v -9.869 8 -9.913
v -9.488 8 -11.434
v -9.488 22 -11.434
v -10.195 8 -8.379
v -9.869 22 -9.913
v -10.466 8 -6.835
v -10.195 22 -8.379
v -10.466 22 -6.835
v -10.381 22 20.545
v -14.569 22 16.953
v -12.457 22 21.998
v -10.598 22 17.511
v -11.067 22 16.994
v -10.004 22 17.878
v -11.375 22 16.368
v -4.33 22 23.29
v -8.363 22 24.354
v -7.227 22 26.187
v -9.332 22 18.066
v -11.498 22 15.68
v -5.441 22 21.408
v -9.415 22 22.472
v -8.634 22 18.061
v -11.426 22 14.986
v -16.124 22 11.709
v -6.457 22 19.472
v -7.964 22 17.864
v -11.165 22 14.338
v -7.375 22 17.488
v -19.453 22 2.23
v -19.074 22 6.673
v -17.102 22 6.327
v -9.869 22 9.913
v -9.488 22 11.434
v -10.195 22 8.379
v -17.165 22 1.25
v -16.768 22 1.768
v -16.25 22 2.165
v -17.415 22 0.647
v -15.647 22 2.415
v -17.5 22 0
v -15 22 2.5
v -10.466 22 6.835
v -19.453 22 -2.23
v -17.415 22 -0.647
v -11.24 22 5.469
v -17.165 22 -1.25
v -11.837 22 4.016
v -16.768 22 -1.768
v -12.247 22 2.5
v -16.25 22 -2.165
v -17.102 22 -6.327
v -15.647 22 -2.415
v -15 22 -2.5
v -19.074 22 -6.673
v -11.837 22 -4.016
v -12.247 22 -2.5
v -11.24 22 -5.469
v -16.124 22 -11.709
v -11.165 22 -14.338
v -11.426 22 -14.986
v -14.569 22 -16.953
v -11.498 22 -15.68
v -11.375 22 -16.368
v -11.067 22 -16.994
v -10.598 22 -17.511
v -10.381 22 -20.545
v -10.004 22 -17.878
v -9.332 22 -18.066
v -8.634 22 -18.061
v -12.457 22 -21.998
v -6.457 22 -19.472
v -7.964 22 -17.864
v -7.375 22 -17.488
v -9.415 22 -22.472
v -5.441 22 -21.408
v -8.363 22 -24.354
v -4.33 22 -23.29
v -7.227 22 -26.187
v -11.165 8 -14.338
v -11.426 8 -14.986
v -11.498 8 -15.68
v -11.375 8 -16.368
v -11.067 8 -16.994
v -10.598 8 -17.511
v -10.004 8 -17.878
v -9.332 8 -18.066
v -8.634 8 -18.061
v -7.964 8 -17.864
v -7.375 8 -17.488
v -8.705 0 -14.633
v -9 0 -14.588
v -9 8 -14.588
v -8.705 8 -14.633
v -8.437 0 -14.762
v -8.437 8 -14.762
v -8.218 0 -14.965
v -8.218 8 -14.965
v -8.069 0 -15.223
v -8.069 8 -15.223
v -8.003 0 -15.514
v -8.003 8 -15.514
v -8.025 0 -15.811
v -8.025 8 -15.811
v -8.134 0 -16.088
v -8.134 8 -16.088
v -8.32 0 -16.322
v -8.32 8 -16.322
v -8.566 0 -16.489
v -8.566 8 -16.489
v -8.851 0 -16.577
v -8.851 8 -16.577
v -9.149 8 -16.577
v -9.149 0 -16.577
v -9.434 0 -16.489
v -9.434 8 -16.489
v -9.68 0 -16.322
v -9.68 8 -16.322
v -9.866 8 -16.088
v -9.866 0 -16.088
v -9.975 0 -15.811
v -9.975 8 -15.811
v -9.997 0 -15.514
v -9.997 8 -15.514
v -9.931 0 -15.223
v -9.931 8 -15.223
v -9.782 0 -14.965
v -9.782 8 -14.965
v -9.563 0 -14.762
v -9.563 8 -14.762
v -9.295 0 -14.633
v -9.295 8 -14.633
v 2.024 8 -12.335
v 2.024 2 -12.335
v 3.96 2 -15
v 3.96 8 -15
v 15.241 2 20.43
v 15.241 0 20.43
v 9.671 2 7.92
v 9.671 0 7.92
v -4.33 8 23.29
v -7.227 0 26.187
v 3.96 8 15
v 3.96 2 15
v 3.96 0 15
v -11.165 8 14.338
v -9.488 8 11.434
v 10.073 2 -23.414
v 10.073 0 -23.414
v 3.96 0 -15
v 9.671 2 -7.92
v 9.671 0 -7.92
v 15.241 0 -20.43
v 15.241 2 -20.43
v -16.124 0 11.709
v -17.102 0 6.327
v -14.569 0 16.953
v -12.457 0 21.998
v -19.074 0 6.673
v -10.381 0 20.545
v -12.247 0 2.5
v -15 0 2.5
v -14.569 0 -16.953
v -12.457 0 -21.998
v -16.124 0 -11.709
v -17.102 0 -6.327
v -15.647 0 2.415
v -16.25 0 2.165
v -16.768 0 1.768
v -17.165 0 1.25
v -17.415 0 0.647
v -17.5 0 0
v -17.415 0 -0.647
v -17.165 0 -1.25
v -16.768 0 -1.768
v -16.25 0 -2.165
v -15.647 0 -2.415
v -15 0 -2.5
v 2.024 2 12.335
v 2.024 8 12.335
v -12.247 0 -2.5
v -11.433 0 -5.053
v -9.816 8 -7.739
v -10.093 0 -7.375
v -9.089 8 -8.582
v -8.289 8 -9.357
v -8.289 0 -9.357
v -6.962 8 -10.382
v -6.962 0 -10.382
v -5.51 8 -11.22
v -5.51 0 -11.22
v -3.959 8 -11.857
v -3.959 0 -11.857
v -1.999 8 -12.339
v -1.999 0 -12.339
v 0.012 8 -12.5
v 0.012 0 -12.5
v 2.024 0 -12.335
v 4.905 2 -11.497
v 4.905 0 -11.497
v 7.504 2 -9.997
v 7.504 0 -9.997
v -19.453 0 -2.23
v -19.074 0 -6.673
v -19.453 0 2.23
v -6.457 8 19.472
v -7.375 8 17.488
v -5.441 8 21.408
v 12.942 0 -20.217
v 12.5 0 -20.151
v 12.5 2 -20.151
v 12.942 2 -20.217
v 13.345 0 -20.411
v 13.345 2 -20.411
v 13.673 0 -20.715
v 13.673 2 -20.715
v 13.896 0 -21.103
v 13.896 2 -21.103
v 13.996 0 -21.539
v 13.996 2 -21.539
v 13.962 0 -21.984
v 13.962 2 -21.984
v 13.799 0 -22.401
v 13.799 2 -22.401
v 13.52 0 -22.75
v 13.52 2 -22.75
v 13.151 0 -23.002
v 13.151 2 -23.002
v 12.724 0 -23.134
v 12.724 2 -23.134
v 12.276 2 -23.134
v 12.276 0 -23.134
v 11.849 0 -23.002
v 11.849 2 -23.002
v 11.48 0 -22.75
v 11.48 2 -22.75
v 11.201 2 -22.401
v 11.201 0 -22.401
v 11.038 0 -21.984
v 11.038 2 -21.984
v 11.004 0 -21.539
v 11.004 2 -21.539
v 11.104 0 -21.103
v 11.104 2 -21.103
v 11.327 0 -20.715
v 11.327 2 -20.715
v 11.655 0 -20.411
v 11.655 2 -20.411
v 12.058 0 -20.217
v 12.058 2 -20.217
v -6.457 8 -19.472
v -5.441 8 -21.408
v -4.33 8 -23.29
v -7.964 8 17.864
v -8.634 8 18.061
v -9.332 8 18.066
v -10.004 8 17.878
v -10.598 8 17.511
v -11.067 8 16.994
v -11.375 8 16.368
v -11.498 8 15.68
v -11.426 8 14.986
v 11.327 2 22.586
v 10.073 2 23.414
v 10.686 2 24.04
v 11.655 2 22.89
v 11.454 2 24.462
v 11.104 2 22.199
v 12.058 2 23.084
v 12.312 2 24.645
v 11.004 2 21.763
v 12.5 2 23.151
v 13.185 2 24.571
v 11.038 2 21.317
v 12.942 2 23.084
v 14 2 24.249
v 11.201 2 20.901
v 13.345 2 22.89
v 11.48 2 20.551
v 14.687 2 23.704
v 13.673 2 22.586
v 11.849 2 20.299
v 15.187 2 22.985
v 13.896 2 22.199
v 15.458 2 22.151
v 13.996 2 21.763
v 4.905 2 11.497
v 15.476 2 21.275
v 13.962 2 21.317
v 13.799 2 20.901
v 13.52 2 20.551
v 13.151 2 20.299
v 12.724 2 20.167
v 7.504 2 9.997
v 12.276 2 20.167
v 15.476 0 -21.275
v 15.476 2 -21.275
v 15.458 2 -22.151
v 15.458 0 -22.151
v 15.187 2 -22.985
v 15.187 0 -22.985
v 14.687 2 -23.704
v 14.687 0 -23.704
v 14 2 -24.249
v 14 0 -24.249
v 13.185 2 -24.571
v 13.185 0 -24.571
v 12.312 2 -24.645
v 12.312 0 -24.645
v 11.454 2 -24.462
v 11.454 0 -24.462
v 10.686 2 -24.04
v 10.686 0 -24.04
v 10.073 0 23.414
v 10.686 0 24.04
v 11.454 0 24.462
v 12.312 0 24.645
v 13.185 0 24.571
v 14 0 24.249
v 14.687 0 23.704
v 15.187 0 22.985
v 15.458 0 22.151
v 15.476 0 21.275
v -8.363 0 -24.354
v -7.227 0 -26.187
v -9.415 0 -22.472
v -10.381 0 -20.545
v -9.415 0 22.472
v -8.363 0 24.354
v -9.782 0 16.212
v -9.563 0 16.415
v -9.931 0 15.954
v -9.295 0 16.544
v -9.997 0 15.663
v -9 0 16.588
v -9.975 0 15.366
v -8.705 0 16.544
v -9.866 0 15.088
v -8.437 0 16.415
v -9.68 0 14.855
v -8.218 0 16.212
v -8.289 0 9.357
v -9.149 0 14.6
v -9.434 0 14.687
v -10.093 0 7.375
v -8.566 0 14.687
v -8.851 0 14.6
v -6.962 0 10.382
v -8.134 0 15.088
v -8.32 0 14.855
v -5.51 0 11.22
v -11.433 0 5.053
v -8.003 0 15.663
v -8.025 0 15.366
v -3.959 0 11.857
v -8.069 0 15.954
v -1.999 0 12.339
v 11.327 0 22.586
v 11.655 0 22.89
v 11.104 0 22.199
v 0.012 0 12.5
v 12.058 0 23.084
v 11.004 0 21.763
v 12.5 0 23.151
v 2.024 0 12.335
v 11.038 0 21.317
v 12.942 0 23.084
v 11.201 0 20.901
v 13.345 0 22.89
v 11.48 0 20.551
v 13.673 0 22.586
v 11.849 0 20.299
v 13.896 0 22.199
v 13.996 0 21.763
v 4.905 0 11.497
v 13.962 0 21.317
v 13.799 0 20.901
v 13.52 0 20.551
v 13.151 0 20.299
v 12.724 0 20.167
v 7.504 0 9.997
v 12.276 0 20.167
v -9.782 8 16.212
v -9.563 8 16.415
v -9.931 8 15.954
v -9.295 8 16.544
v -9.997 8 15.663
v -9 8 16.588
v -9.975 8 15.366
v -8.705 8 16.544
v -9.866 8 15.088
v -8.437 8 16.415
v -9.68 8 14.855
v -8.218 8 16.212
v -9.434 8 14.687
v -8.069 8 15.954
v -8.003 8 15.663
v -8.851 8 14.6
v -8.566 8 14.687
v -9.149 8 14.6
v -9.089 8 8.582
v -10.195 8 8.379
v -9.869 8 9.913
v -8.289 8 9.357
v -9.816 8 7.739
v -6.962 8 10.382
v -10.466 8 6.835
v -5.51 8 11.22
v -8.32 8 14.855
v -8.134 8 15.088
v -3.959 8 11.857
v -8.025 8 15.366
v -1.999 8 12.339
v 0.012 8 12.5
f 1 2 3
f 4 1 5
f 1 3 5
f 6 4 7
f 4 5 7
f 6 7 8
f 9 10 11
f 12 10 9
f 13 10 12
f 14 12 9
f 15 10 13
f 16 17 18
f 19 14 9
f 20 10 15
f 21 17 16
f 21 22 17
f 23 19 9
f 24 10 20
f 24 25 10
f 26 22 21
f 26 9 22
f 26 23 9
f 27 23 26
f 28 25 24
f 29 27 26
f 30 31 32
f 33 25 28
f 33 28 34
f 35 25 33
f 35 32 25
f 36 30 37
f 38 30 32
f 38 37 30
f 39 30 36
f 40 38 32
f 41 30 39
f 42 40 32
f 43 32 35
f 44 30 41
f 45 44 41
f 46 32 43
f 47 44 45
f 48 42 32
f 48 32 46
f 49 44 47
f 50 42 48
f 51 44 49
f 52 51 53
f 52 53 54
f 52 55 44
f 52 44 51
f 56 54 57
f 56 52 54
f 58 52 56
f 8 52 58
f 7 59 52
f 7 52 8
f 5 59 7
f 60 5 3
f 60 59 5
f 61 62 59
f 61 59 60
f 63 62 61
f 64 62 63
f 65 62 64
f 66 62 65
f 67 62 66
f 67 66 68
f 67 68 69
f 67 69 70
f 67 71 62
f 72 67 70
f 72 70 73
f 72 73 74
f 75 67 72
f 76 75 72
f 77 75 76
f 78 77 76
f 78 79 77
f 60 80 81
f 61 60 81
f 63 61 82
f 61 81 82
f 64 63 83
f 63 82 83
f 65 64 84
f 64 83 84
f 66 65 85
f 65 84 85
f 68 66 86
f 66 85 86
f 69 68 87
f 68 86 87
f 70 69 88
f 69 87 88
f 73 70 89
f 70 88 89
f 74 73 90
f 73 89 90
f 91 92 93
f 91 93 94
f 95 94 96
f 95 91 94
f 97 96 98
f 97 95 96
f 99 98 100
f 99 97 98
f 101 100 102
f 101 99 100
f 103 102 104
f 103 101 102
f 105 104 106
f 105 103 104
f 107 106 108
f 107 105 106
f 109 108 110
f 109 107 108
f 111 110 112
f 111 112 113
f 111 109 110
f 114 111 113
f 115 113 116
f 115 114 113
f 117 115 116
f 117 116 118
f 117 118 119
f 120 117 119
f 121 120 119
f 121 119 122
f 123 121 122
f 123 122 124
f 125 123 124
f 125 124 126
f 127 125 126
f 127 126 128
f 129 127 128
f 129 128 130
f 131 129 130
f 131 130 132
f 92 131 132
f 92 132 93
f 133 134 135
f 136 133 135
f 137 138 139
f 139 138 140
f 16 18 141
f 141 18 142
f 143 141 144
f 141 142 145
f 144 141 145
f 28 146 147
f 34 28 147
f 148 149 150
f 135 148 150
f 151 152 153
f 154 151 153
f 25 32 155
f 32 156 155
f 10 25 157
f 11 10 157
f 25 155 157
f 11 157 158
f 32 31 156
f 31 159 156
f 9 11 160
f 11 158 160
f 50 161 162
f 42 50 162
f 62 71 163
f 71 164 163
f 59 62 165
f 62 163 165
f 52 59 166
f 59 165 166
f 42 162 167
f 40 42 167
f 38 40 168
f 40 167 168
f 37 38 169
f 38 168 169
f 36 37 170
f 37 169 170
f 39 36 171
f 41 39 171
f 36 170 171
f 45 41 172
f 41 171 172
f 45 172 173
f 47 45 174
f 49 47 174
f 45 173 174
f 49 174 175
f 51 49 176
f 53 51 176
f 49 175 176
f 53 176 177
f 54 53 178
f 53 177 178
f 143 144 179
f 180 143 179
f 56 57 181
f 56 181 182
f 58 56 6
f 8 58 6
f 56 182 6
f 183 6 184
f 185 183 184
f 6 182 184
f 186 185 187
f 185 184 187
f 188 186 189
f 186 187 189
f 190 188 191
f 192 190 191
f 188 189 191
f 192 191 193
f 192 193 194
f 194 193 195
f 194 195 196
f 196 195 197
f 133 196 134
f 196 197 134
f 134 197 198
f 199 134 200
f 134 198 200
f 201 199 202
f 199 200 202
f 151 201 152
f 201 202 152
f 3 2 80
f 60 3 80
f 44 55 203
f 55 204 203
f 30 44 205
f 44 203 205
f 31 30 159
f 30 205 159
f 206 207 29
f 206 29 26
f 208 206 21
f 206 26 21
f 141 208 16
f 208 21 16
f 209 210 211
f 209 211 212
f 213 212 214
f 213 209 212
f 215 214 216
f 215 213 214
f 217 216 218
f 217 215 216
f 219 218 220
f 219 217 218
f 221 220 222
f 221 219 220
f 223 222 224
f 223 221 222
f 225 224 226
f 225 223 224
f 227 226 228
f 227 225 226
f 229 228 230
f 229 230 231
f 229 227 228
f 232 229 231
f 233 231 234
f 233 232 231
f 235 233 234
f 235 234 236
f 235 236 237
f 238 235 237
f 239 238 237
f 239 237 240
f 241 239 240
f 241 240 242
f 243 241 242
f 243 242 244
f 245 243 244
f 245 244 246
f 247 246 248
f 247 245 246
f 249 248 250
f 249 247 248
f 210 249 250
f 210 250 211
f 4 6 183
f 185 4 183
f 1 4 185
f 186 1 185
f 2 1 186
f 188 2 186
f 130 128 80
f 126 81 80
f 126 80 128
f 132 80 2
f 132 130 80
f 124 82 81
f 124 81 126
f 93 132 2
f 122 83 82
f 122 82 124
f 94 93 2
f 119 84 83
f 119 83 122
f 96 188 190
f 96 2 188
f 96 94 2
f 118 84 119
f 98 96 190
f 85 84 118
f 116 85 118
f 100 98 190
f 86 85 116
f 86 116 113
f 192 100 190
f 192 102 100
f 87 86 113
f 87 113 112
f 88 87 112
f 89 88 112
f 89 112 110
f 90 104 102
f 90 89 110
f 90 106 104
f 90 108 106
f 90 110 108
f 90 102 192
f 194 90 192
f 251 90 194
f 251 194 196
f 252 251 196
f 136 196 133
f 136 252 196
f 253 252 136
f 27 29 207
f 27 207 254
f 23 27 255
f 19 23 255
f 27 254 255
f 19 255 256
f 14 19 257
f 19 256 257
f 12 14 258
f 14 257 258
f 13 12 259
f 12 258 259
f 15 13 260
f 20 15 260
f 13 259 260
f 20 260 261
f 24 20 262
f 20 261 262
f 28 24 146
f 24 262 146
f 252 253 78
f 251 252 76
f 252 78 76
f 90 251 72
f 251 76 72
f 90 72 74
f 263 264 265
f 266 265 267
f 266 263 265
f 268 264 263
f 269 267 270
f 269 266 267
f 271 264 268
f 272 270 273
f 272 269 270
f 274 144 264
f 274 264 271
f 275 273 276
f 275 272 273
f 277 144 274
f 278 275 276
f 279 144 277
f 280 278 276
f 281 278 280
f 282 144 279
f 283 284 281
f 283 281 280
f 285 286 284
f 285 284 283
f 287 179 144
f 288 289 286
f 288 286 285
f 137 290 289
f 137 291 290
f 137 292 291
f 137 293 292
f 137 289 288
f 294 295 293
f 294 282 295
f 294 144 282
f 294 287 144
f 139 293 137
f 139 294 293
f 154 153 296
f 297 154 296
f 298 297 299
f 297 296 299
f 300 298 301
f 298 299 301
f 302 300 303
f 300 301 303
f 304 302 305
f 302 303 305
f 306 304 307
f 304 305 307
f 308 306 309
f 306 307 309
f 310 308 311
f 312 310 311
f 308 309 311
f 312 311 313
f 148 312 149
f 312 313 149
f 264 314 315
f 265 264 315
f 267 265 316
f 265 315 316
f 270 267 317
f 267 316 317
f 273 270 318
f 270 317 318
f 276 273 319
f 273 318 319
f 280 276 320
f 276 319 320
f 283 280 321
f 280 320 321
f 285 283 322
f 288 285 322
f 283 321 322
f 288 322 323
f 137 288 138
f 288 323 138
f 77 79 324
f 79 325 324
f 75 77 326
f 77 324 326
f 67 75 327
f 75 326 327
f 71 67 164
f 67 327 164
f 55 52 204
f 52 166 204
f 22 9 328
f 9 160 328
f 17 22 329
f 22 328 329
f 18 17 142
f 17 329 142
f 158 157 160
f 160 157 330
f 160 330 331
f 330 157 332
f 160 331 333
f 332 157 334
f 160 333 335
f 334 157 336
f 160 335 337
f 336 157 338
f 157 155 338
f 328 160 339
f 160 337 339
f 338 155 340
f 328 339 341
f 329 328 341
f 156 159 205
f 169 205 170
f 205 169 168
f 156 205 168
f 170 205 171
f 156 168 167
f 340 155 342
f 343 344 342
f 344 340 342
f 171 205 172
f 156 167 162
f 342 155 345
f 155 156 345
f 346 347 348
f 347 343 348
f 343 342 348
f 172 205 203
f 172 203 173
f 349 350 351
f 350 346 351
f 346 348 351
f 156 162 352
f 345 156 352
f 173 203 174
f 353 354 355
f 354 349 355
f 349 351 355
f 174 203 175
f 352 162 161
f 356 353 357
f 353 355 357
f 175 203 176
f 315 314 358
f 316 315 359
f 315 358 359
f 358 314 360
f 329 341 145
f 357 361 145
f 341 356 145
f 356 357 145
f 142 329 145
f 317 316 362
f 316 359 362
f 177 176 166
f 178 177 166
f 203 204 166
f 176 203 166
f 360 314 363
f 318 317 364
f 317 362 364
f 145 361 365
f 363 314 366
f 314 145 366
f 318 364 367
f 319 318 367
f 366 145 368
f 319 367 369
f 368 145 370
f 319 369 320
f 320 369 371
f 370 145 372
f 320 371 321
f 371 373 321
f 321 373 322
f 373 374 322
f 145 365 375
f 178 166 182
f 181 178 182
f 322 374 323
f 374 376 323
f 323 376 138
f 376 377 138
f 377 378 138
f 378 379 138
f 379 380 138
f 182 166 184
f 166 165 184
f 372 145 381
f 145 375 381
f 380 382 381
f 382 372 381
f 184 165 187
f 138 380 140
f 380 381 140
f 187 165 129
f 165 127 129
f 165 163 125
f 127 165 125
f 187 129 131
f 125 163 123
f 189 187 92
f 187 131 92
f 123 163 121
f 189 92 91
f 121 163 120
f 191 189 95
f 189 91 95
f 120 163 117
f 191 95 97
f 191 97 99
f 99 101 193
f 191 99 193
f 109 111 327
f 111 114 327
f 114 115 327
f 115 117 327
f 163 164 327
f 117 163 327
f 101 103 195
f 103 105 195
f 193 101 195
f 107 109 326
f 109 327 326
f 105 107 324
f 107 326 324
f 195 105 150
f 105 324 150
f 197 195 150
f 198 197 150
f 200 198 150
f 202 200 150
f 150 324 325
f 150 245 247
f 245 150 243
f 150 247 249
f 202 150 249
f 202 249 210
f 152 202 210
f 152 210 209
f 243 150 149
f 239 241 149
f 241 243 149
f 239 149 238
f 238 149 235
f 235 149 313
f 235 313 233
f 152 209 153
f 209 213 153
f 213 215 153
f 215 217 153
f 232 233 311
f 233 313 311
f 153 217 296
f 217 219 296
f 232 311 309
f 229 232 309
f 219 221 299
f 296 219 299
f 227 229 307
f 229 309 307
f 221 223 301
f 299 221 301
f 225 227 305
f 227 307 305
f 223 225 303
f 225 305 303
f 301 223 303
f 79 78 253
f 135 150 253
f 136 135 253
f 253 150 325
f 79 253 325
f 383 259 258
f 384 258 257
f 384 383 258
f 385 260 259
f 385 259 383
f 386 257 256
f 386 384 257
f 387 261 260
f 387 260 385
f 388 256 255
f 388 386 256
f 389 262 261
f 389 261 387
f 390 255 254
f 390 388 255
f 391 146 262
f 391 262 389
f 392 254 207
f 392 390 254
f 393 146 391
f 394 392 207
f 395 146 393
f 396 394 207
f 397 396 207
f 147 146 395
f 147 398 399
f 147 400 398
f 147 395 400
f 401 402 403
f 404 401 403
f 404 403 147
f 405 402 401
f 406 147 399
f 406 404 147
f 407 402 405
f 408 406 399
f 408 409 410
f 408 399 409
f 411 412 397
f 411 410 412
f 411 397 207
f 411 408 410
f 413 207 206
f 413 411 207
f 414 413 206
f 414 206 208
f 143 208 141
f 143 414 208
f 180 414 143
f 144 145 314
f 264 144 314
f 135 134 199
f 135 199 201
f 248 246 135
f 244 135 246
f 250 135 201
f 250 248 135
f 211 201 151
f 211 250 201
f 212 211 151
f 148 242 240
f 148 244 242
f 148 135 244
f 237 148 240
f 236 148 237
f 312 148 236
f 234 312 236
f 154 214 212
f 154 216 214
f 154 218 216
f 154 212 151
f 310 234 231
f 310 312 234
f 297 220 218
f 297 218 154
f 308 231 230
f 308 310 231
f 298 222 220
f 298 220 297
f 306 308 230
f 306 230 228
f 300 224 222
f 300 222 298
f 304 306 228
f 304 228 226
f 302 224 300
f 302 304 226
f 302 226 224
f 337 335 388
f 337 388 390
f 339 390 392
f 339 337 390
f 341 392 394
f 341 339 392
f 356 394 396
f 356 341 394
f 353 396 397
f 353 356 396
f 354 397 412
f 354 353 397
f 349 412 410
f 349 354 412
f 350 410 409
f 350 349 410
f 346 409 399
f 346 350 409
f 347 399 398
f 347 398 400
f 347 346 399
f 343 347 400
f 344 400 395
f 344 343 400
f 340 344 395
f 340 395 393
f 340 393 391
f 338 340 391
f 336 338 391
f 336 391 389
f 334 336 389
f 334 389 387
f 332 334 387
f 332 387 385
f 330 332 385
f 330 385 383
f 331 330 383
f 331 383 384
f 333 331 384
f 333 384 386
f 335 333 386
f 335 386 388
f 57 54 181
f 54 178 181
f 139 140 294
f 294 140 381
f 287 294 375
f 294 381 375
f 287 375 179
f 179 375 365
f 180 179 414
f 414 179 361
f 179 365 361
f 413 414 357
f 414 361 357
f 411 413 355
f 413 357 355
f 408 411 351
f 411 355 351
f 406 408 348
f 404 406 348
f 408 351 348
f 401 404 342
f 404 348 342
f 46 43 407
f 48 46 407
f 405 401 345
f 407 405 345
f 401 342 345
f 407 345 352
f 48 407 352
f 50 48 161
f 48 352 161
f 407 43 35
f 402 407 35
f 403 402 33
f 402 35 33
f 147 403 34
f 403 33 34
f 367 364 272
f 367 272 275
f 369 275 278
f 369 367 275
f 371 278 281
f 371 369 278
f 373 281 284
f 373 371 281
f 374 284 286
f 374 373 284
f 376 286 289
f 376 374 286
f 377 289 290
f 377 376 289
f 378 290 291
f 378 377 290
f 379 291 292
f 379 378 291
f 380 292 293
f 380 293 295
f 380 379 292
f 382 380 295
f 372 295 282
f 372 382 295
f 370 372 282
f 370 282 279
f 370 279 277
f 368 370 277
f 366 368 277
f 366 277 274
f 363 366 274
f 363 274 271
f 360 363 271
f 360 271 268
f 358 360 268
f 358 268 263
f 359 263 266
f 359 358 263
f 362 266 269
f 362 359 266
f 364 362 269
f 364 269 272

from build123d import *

# Parameters (mm, degrees)
SKETCH2_R           = 1
BOSS_EXTRUDE1_DEPTH = 8
SKETCH2_5_R         = 1.5
BOSS_EXTRUDE9_DEPTH = 2
SKETCH2_4_R         = 1.5
BOSS_EXTRUDE6_DEPTH = 2
BOSS_EXTRUDE7_DEPTH = 14
SKETCH7_R           = 44
CUT_EXTRUDE2_DEPTH  = 14


with BuildPart() as part:
    # Sketch2 → Boss-Extrude1 (new body)
    with BuildSketch(Plane(origin=(0, 0, 0), x_dir=(1, 0, 0), z_dir=(0, 1, 0))):
        with BuildLine():
            Line((-15, 2.5), (-12.247448714, 2.5))
            ThreePointArc((-12.247448714, 2.5), (-7.093218404, 10.292533831), (2.023666108, 12.335103384))
            Line((2.023666108, 12.335103384), (3.959826833, 15))
            Line((3.959826833, 15), (-7.227290386, 26.187117219))
            ThreePointArc((-7.227290386, 26.187117219), (-8.899257061, 23.419057575), (-10.381047178, 20.54470116))
            Line((-10.381047178, 20.54470116), (-12.456884927, 21.9982184))
            ThreePointArc((-12.456884927, 21.9982184), (-15.417724422, 14.351792983), (-17.102086602, 6.32699914))
            Line((-17.102086602, 6.32699914), (-19.074188035, 6.67300086))
            ThreePointArc((-19.074188035, 6.67300086), (-19.5, 0), (-19.074188035, -6.67300086))
            Line((-19.074188035, -6.67300086), (-17.102086602, -6.32699914))
            ThreePointArc((-17.102086602, -6.32699914), (-15.417724422, -14.351792983), (-12.456884927, -21.9982184))
            Line((-12.456884927, -21.9982184), (-10.381047178, -20.54470116))
            ThreePointArc((-10.381047178, -20.54470116), (-8.899257061, -23.419057575), (-7.227290386, -26.187117219))
            Line((-7.227290386, -26.187117219), (3.959826833, -15))
            Line((3.959826833, -15), (2.023666108, -12.335103384))
            ThreePointArc((2.023666108, -12.335103384), (-7.093218404, -10.292533831), (-12.247448714, -2.5))
            Line((-12.247448714, -2.5), (-15, -2.5))
            ThreePointArc((-15, -2.5), (-17.5, 0), (-15, 2.5))
        make_face()
        with Locations((-9, 15.588457268)):
            Circle(SKETCH2_R, mode=Mode.SUBTRACT)
        with Locations((-9, -15.588457268)):
            Circle(SKETCH2_R, mode=Mode.SUBTRACT)
    extrude(amount=BOSS_EXTRUDE1_DEPTH)

    # Sketch2<5> → Boss-Extrude9 (add)
    # profile 1 of 2: a face of its own
    with BuildSketch(Plane(origin=(0, 0, 0), x_dir=(1, 0, 0), z_dir=(0, 1, 0))):
        with BuildLine():
            Line((10.072949017, 23.413990851), (2.023666108, 12.335103384))
            ThreePointArc((2.023666108, 12.335103384), (6.25, 10.825317547), (9.670679834, 7.92009795))
            Line((9.670679834, 7.92009795), (15.240636373, 20.430425165))
            ThreePointArc((15.240636373, 20.430425165), (14, 24.248711306), (10.072949017, 23.413990851))
        make_face()
        with Locations((12.5, 21.650635095)):
            Circle(SKETCH2_5_R, mode=Mode.SUBTRACT)
    # profile 2 of 2: a face of its own
    with BuildSketch(Plane(origin=(0, 0, 0), x_dir=(1, 0, 0), z_dir=(0, 1, 0))):
        with BuildLine():
            Line((15.240636373, -20.430425165), (9.670679834, -7.92009795))
            ThreePointArc((9.670679834, -7.92009795), (6.25, -10.825317547), (2.023666108, -12.335103384))
            Line((2.023666108, -12.335103384), (10.072949017, -23.413990851))
            ThreePointArc((10.072949017, -23.413990851), (14, -24.248711306), (15.240636373, -20.430425165))
        make_face()
        with Locations((12.5, -21.650635095)):
            Circle(SKETCH2_5_R, mode=Mode.SUBTRACT)
    extrude(amount=BOSS_EXTRUDE9_DEPTH)

    # Sketch2<4> → Boss-Extrude6 (add)
    # profile 1 of 2: a face of its own
    with BuildSketch(Plane(origin=(0, 0, 0), x_dir=(1, 0, 0), z_dir=(0, 1, 0))):
        with BuildLine():
            Line((10.072949017, 23.413990851), (2.023666108, 12.335103384))
            ThreePointArc((2.023666108, 12.335103384), (6.25, 10.825317547), (9.670679834, 7.92009795))
            Line((9.670679834, 7.92009795), (15.240636373, 20.430425165))
            ThreePointArc((15.240636373, 20.430425165), (14, 24.248711306), (10.072949017, 23.413990851))
        make_face()
        with Locations((12.5, 21.650635095)):
            Circle(SKETCH2_4_R, mode=Mode.SUBTRACT)
    # profile 2 of 2: a face of its own
    with BuildSketch(Plane(origin=(0, 0, 0), x_dir=(1, 0, 0), z_dir=(0, 1, 0))):
        with BuildLine():
            Line((15.240636373, -20.430425165), (9.670679834, -7.92009795))
            ThreePointArc((9.670679834, -7.92009795), (6.25, -10.825317547), (2.023666108, -12.335103384))
            Line((2.023666108, -12.335103384), (10.072949017, -23.413990851))
            ThreePointArc((10.072949017, -23.413990851), (14, -24.248711306), (15.240636373, -20.430425165))
        make_face()
        with Locations((12.5, -21.650635095)):
            Circle(SKETCH2_4_R, mode=Mode.SUBTRACT)
    extrude(amount=BOSS_EXTRUDE6_DEPTH)

    # Sketch5 → Boss-Extrude7 (add)
    with BuildSketch(Plane(origin=(0, 8, 0), x_dir=(1, 0, 0), z_dir=(0, 1, 0))):
        with BuildLine():
            Line((-15, 2.5), (-12.247448714, 2.5))
            ThreePointArc((-12.247448714, 2.5), (-10.825317547, 6.25), (-8.288787866, 9.356601718))
            Line((-8.288787866, 9.356601718), (-11.165063509, 14.338457268))
            ThreePointArc((-11.165063509, 14.338457268), (-10.25, 17.753520778), (-6.834936491, 16.838457268))
            Line((-6.834936491, 16.838457268), (-3.958660847, 11.856601718))
            ThreePointArc((-3.958660847, 11.856601718), (-0.996640417, 12.460204969), (2.023666108, 12.335103384))
            Line((2.023666108, 12.335103384), (3.959826833, 15))
            Line((3.959826833, 15), (-7.227290386, 26.187117219))
            ThreePointArc((-7.227290386, 26.187117219), (-8.899257061, 23.419057575), (-10.381047178, 20.54470116))
            Line((-10.381047178, 20.54470116), (-12.456884927, 21.9982184))
            ThreePointArc((-12.456884927, 21.9982184), (-15.417724422, 14.351792983), (-17.102086602, 6.32699914))
            Line((-17.102086602, 6.32699914), (-19.074188035, 6.67300086))
            ThreePointArc((-19.074188035, 6.67300086), (-19.5, 0), (-19.074188035, -6.67300086))
            Line((-19.074188035, -6.67300086), (-17.102086602, -6.32699914))
            ThreePointArc((-17.102086602, -6.32699914), (-15.417724422, -14.351792983), (-12.456884927, -21.9982184))
            Line((-12.456884927, -21.9982184), (-10.381047178, -20.54470116))
            ThreePointArc((-10.381047178, -20.54470116), (-8.899257061, -23.419057575), (-7.227290386, -26.187117219))
            Line((-7.227290386, -26.187117219), (3.959826833, -15))
            Line((3.959826833, -15), (2.023666108, -12.335103384))
            ThreePointArc((2.023666108, -12.335103384), (-0.996640417, -12.460204969), (-3.958660847, -11.856601718))
            Line((-3.958660847, -11.856601718), (-6.834936491, -16.838457268))
            ThreePointArc((-6.834936491, -16.838457268), (-10.25, -17.753520778), (-11.165063509, -14.338457268))
            Line((-11.165063509, -14.338457268), (-8.288787866, -9.356601718))
            ThreePointArc((-8.288787866, -9.356601718), (-10.825317547, -6.25), (-12.247448714, -2.5))
            Line((-12.247448714, -2.5), (-15, -2.5))
            ThreePointArc((-15, -2.5), (-17.5, 0), (-15, 2.5))
        make_face()
    extrude(amount=BOSS_EXTRUDE7_DEPTH)

    # Sketch7 → Cut-Extrude2 (cut)
    with BuildSketch(Plane(origin=(0, 22, 0), x_dir=(1, 0, 0), z_dir=(0, 1, 0))):
        with Locations((33, 0)):
            Circle(SKETCH7_R)
    extrude(amount=-CUT_EXTRUDE2_DEPTH, mode=Mode.SUBTRACT)


solid = part.part
